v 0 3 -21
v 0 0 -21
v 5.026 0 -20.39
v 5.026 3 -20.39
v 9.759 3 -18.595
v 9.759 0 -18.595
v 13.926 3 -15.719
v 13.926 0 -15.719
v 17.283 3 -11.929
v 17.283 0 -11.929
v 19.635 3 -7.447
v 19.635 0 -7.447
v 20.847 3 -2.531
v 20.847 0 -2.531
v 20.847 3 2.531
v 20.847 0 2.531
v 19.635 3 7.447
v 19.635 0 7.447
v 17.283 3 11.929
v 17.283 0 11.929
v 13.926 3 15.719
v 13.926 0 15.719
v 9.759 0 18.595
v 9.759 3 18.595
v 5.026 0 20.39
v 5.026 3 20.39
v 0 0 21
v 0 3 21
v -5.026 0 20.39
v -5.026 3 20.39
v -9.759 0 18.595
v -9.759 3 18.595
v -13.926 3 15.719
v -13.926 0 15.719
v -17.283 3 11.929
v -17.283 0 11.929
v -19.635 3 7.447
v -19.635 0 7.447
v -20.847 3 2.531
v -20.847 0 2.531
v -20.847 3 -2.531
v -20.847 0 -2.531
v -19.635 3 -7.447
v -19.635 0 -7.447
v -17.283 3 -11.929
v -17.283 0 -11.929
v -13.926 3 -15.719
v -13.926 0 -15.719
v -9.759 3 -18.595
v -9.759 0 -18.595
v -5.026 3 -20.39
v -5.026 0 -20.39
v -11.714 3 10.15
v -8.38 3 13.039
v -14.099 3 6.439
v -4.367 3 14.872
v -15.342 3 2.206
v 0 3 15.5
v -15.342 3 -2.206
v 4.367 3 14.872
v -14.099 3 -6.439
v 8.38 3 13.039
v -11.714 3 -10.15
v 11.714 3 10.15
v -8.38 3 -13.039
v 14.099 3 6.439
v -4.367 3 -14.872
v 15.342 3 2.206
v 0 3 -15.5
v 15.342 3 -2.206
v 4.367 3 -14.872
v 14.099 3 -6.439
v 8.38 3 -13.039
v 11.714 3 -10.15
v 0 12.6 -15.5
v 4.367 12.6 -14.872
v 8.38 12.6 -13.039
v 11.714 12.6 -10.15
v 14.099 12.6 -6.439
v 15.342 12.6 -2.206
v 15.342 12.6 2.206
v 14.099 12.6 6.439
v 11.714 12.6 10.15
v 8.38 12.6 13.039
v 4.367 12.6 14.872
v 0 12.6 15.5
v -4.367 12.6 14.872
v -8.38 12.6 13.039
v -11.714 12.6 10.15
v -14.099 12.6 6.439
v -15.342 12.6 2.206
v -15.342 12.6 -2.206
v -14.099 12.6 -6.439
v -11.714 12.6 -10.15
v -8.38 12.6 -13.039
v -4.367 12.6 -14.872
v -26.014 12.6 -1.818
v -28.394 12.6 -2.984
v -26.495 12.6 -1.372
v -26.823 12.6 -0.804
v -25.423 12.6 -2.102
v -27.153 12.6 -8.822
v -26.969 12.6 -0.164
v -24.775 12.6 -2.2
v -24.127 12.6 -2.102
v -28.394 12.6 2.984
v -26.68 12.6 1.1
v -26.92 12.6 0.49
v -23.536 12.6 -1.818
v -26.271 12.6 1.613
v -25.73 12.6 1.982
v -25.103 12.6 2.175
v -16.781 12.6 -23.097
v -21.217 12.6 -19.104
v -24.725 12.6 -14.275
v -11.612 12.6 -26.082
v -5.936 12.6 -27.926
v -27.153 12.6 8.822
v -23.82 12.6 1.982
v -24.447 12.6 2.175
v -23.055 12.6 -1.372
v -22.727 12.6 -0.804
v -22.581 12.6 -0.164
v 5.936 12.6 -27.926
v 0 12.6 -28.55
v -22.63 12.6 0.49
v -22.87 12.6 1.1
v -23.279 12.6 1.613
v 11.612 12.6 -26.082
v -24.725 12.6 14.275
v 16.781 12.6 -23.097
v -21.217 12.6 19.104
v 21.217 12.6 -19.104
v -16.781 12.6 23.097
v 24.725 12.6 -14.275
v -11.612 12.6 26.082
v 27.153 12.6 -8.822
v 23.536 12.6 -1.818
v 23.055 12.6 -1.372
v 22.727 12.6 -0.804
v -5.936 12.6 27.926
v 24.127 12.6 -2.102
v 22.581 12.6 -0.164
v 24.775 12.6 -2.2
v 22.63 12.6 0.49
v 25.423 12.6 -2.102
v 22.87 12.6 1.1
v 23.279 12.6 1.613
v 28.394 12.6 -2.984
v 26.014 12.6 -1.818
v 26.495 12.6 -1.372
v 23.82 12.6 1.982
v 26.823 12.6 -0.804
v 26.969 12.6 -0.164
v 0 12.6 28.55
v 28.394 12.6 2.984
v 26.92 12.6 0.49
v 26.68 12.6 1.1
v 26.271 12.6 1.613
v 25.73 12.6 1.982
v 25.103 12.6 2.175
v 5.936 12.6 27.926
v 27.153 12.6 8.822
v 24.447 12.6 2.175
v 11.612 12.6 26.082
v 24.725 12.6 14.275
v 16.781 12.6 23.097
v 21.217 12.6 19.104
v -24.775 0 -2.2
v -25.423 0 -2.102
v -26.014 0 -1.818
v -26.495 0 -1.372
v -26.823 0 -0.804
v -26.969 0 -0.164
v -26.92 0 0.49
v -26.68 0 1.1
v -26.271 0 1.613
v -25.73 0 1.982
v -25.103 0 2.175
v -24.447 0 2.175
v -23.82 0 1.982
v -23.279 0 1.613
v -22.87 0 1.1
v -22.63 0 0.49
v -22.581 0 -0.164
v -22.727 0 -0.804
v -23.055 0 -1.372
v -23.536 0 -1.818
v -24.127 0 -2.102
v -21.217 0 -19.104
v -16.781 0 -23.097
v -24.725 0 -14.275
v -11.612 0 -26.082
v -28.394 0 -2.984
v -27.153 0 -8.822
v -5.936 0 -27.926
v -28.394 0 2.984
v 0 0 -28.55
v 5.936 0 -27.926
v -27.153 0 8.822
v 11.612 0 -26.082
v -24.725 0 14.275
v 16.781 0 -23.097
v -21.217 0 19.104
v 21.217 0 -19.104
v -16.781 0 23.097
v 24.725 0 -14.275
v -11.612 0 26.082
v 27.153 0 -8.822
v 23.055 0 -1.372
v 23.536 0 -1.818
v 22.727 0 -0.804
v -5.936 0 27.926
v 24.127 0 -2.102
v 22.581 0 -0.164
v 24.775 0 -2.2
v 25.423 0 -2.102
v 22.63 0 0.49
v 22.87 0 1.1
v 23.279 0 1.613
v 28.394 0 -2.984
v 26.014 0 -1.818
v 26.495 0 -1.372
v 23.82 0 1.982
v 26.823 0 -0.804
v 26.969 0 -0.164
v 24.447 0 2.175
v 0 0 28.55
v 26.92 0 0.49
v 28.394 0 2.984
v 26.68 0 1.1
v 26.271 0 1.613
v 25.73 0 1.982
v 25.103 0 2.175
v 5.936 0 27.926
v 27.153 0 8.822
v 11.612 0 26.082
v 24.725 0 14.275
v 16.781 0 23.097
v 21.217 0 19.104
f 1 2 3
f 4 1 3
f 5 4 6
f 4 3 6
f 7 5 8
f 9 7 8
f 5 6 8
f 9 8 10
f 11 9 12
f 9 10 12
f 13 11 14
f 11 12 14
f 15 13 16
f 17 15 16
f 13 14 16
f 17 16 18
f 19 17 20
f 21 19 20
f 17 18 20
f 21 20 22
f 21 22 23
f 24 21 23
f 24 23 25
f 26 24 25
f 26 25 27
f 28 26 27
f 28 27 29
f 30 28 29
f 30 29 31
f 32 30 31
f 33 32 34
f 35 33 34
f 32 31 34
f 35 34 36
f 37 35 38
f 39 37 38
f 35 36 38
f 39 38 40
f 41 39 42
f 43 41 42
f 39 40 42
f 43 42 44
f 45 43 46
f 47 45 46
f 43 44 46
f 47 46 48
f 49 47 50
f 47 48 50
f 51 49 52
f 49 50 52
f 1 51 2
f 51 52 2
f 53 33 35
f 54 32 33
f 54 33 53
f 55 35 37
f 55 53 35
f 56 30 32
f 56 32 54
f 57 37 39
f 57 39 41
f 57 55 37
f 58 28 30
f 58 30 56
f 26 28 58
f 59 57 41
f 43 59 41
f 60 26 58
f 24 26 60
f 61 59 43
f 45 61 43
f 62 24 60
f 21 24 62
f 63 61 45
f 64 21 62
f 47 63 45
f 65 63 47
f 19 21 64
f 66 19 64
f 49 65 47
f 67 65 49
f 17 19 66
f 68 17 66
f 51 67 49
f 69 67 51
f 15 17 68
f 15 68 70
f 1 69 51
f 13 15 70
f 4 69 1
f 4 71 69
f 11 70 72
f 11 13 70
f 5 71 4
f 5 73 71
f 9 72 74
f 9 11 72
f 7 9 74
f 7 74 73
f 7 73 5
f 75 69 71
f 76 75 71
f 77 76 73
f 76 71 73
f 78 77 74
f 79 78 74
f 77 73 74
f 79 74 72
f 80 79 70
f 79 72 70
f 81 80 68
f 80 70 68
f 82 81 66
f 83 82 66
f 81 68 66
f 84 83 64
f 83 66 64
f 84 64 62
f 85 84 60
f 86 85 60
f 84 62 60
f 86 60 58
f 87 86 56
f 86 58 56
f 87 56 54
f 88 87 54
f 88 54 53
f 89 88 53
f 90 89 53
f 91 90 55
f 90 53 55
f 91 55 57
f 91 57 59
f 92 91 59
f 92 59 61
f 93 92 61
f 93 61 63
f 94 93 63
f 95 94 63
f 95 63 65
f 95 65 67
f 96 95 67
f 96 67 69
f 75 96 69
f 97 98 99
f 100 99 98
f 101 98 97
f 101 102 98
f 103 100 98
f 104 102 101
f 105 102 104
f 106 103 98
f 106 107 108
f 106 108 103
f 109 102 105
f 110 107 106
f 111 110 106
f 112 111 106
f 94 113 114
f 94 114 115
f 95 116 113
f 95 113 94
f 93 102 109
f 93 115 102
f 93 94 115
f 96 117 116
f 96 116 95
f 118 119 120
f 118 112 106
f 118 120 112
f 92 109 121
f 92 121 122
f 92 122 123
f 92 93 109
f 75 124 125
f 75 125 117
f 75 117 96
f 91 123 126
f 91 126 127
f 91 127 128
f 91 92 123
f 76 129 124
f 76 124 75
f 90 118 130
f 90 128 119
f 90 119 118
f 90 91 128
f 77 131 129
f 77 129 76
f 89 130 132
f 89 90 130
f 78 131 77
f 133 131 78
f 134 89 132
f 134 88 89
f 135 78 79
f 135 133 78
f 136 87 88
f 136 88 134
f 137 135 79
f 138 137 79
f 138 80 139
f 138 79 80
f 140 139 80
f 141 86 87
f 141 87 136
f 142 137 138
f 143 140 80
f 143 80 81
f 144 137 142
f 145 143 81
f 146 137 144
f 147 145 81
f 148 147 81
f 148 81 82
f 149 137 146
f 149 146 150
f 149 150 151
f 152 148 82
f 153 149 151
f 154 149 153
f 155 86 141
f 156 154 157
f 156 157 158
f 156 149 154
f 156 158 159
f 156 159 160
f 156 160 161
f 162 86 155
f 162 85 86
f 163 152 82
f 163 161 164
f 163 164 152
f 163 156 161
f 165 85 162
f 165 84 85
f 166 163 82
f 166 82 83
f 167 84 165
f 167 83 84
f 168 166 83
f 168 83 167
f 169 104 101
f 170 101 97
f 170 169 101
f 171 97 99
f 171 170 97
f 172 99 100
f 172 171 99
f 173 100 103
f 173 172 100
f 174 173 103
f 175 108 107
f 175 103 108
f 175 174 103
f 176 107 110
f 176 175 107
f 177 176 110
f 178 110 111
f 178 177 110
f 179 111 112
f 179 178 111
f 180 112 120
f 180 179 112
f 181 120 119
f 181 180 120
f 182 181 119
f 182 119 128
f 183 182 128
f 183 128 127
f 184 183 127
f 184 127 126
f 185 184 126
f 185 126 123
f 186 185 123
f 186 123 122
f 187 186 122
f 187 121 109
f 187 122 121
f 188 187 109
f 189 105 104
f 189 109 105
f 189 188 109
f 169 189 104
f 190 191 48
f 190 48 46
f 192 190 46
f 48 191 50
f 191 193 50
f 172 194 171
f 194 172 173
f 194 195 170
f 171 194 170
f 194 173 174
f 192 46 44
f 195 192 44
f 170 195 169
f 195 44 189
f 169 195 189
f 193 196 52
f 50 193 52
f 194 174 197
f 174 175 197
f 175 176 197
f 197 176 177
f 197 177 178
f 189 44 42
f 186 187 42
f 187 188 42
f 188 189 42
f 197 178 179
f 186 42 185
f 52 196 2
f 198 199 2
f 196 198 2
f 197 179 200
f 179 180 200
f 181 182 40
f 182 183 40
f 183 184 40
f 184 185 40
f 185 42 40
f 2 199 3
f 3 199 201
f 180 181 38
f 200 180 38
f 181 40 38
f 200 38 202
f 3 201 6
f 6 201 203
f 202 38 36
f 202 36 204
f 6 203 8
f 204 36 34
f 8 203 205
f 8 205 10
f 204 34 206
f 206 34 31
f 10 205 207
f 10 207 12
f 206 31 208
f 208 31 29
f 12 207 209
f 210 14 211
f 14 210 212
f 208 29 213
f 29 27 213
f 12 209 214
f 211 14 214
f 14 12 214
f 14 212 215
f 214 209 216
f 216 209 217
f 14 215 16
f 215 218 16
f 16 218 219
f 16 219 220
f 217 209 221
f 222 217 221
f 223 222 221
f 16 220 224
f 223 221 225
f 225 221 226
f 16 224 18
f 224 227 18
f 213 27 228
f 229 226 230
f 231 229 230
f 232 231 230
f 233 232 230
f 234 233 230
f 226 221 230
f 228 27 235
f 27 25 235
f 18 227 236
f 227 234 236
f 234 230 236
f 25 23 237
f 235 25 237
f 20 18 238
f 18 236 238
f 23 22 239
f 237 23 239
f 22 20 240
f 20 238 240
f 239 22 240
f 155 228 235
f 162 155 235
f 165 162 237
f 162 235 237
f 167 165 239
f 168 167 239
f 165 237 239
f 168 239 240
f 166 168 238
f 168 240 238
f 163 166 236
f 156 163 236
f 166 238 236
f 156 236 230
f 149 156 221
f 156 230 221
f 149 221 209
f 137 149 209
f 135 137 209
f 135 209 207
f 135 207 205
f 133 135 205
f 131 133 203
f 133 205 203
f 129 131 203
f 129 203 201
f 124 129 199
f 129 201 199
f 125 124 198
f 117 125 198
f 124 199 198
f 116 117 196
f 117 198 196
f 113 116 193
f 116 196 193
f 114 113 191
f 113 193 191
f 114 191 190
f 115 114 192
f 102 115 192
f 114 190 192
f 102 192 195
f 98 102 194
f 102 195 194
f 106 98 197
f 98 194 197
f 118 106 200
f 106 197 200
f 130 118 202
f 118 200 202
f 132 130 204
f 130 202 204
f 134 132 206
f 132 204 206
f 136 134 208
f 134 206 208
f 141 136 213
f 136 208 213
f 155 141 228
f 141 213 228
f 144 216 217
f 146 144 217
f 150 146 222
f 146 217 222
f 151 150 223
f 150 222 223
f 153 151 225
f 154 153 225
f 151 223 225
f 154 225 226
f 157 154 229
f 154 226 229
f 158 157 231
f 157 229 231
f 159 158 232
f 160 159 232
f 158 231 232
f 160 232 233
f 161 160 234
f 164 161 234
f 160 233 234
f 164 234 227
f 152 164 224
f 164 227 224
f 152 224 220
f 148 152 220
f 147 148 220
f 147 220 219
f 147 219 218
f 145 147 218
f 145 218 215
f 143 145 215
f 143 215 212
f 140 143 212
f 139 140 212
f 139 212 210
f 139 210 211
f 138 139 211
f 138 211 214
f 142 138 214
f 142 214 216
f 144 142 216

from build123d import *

# Parameters (mm, degrees)
SKETCH2_R           = 28.55
BOSS_EXTRUDE1_DEPTH = 12.6
SKETCH3_R           = 21
CUT_EXTRUDE1_DEPTH  = 3
SKETCH4_R           = 15.5
CUT_EXTRUDE2_DEPTH  = 24
SKETCH5_R           = 2.2
CUT_EXTRUDE3_DEPTH  = 24


with BuildPart() as part:
    # Sketch2 → Boss-Extrude1 (new body)
    with BuildSketch(Plane(origin=(0, 0, 0), x_dir=(1, 0, 0), z_dir=(0, 1, 0))):
        with Locations(Location((0, 0, 0), (0, 0, 270))):
            Circle(SKETCH2_R)
    extrude(amount=BOSS_EXTRUDE1_DEPTH)

    # Sketch3 → Cut-Extrude1 (cut)
    with BuildSketch(Plane.XZ):
        with Locations(Location((0, 0, 0), (0, 0, 270))):
            Circle(SKETCH3_R)
    extrude(amount=-CUT_EXTRUDE1_DEPTH, mode=Mode.SUBTRACT)

    # Sketch4 → Cut-Extrude2 (cut)
    with BuildSketch(Plane.XZ.offset(-3)):
        with Locations(Location((0, 0, 0), (0, 0, 270))):
            Circle(SKETCH4_R)
    extrude(amount=-CUT_EXTRUDE2_DEPTH, mode=Mode.SUBTRACT)

    # Sketch5 → Cut-Extrude3 (cut)
    with BuildSketch(Plane(origin=(0, 0, 0), x_dir=(-1, 0, 0), z_dir=(0, -1, 0))):
        with Locations(Location((-24.775, 0, 0), (0, 0, 90))):
            Circle(SKETCH5_R)
    cut_extrude3 = extrude(amount=-CUT_EXTRUDE3_DEPTH, mode=Mode.SUBTRACT)

    # Mirror1: Cut-Extrude3 across plane
    add(cut_extrude3.mirror(Plane(origin=(0, 0, 0), x_dir=(0, 0, 1), z_dir=(1, 0, 0))), mode=Mode.SUBTRACT)


solid = part.part
